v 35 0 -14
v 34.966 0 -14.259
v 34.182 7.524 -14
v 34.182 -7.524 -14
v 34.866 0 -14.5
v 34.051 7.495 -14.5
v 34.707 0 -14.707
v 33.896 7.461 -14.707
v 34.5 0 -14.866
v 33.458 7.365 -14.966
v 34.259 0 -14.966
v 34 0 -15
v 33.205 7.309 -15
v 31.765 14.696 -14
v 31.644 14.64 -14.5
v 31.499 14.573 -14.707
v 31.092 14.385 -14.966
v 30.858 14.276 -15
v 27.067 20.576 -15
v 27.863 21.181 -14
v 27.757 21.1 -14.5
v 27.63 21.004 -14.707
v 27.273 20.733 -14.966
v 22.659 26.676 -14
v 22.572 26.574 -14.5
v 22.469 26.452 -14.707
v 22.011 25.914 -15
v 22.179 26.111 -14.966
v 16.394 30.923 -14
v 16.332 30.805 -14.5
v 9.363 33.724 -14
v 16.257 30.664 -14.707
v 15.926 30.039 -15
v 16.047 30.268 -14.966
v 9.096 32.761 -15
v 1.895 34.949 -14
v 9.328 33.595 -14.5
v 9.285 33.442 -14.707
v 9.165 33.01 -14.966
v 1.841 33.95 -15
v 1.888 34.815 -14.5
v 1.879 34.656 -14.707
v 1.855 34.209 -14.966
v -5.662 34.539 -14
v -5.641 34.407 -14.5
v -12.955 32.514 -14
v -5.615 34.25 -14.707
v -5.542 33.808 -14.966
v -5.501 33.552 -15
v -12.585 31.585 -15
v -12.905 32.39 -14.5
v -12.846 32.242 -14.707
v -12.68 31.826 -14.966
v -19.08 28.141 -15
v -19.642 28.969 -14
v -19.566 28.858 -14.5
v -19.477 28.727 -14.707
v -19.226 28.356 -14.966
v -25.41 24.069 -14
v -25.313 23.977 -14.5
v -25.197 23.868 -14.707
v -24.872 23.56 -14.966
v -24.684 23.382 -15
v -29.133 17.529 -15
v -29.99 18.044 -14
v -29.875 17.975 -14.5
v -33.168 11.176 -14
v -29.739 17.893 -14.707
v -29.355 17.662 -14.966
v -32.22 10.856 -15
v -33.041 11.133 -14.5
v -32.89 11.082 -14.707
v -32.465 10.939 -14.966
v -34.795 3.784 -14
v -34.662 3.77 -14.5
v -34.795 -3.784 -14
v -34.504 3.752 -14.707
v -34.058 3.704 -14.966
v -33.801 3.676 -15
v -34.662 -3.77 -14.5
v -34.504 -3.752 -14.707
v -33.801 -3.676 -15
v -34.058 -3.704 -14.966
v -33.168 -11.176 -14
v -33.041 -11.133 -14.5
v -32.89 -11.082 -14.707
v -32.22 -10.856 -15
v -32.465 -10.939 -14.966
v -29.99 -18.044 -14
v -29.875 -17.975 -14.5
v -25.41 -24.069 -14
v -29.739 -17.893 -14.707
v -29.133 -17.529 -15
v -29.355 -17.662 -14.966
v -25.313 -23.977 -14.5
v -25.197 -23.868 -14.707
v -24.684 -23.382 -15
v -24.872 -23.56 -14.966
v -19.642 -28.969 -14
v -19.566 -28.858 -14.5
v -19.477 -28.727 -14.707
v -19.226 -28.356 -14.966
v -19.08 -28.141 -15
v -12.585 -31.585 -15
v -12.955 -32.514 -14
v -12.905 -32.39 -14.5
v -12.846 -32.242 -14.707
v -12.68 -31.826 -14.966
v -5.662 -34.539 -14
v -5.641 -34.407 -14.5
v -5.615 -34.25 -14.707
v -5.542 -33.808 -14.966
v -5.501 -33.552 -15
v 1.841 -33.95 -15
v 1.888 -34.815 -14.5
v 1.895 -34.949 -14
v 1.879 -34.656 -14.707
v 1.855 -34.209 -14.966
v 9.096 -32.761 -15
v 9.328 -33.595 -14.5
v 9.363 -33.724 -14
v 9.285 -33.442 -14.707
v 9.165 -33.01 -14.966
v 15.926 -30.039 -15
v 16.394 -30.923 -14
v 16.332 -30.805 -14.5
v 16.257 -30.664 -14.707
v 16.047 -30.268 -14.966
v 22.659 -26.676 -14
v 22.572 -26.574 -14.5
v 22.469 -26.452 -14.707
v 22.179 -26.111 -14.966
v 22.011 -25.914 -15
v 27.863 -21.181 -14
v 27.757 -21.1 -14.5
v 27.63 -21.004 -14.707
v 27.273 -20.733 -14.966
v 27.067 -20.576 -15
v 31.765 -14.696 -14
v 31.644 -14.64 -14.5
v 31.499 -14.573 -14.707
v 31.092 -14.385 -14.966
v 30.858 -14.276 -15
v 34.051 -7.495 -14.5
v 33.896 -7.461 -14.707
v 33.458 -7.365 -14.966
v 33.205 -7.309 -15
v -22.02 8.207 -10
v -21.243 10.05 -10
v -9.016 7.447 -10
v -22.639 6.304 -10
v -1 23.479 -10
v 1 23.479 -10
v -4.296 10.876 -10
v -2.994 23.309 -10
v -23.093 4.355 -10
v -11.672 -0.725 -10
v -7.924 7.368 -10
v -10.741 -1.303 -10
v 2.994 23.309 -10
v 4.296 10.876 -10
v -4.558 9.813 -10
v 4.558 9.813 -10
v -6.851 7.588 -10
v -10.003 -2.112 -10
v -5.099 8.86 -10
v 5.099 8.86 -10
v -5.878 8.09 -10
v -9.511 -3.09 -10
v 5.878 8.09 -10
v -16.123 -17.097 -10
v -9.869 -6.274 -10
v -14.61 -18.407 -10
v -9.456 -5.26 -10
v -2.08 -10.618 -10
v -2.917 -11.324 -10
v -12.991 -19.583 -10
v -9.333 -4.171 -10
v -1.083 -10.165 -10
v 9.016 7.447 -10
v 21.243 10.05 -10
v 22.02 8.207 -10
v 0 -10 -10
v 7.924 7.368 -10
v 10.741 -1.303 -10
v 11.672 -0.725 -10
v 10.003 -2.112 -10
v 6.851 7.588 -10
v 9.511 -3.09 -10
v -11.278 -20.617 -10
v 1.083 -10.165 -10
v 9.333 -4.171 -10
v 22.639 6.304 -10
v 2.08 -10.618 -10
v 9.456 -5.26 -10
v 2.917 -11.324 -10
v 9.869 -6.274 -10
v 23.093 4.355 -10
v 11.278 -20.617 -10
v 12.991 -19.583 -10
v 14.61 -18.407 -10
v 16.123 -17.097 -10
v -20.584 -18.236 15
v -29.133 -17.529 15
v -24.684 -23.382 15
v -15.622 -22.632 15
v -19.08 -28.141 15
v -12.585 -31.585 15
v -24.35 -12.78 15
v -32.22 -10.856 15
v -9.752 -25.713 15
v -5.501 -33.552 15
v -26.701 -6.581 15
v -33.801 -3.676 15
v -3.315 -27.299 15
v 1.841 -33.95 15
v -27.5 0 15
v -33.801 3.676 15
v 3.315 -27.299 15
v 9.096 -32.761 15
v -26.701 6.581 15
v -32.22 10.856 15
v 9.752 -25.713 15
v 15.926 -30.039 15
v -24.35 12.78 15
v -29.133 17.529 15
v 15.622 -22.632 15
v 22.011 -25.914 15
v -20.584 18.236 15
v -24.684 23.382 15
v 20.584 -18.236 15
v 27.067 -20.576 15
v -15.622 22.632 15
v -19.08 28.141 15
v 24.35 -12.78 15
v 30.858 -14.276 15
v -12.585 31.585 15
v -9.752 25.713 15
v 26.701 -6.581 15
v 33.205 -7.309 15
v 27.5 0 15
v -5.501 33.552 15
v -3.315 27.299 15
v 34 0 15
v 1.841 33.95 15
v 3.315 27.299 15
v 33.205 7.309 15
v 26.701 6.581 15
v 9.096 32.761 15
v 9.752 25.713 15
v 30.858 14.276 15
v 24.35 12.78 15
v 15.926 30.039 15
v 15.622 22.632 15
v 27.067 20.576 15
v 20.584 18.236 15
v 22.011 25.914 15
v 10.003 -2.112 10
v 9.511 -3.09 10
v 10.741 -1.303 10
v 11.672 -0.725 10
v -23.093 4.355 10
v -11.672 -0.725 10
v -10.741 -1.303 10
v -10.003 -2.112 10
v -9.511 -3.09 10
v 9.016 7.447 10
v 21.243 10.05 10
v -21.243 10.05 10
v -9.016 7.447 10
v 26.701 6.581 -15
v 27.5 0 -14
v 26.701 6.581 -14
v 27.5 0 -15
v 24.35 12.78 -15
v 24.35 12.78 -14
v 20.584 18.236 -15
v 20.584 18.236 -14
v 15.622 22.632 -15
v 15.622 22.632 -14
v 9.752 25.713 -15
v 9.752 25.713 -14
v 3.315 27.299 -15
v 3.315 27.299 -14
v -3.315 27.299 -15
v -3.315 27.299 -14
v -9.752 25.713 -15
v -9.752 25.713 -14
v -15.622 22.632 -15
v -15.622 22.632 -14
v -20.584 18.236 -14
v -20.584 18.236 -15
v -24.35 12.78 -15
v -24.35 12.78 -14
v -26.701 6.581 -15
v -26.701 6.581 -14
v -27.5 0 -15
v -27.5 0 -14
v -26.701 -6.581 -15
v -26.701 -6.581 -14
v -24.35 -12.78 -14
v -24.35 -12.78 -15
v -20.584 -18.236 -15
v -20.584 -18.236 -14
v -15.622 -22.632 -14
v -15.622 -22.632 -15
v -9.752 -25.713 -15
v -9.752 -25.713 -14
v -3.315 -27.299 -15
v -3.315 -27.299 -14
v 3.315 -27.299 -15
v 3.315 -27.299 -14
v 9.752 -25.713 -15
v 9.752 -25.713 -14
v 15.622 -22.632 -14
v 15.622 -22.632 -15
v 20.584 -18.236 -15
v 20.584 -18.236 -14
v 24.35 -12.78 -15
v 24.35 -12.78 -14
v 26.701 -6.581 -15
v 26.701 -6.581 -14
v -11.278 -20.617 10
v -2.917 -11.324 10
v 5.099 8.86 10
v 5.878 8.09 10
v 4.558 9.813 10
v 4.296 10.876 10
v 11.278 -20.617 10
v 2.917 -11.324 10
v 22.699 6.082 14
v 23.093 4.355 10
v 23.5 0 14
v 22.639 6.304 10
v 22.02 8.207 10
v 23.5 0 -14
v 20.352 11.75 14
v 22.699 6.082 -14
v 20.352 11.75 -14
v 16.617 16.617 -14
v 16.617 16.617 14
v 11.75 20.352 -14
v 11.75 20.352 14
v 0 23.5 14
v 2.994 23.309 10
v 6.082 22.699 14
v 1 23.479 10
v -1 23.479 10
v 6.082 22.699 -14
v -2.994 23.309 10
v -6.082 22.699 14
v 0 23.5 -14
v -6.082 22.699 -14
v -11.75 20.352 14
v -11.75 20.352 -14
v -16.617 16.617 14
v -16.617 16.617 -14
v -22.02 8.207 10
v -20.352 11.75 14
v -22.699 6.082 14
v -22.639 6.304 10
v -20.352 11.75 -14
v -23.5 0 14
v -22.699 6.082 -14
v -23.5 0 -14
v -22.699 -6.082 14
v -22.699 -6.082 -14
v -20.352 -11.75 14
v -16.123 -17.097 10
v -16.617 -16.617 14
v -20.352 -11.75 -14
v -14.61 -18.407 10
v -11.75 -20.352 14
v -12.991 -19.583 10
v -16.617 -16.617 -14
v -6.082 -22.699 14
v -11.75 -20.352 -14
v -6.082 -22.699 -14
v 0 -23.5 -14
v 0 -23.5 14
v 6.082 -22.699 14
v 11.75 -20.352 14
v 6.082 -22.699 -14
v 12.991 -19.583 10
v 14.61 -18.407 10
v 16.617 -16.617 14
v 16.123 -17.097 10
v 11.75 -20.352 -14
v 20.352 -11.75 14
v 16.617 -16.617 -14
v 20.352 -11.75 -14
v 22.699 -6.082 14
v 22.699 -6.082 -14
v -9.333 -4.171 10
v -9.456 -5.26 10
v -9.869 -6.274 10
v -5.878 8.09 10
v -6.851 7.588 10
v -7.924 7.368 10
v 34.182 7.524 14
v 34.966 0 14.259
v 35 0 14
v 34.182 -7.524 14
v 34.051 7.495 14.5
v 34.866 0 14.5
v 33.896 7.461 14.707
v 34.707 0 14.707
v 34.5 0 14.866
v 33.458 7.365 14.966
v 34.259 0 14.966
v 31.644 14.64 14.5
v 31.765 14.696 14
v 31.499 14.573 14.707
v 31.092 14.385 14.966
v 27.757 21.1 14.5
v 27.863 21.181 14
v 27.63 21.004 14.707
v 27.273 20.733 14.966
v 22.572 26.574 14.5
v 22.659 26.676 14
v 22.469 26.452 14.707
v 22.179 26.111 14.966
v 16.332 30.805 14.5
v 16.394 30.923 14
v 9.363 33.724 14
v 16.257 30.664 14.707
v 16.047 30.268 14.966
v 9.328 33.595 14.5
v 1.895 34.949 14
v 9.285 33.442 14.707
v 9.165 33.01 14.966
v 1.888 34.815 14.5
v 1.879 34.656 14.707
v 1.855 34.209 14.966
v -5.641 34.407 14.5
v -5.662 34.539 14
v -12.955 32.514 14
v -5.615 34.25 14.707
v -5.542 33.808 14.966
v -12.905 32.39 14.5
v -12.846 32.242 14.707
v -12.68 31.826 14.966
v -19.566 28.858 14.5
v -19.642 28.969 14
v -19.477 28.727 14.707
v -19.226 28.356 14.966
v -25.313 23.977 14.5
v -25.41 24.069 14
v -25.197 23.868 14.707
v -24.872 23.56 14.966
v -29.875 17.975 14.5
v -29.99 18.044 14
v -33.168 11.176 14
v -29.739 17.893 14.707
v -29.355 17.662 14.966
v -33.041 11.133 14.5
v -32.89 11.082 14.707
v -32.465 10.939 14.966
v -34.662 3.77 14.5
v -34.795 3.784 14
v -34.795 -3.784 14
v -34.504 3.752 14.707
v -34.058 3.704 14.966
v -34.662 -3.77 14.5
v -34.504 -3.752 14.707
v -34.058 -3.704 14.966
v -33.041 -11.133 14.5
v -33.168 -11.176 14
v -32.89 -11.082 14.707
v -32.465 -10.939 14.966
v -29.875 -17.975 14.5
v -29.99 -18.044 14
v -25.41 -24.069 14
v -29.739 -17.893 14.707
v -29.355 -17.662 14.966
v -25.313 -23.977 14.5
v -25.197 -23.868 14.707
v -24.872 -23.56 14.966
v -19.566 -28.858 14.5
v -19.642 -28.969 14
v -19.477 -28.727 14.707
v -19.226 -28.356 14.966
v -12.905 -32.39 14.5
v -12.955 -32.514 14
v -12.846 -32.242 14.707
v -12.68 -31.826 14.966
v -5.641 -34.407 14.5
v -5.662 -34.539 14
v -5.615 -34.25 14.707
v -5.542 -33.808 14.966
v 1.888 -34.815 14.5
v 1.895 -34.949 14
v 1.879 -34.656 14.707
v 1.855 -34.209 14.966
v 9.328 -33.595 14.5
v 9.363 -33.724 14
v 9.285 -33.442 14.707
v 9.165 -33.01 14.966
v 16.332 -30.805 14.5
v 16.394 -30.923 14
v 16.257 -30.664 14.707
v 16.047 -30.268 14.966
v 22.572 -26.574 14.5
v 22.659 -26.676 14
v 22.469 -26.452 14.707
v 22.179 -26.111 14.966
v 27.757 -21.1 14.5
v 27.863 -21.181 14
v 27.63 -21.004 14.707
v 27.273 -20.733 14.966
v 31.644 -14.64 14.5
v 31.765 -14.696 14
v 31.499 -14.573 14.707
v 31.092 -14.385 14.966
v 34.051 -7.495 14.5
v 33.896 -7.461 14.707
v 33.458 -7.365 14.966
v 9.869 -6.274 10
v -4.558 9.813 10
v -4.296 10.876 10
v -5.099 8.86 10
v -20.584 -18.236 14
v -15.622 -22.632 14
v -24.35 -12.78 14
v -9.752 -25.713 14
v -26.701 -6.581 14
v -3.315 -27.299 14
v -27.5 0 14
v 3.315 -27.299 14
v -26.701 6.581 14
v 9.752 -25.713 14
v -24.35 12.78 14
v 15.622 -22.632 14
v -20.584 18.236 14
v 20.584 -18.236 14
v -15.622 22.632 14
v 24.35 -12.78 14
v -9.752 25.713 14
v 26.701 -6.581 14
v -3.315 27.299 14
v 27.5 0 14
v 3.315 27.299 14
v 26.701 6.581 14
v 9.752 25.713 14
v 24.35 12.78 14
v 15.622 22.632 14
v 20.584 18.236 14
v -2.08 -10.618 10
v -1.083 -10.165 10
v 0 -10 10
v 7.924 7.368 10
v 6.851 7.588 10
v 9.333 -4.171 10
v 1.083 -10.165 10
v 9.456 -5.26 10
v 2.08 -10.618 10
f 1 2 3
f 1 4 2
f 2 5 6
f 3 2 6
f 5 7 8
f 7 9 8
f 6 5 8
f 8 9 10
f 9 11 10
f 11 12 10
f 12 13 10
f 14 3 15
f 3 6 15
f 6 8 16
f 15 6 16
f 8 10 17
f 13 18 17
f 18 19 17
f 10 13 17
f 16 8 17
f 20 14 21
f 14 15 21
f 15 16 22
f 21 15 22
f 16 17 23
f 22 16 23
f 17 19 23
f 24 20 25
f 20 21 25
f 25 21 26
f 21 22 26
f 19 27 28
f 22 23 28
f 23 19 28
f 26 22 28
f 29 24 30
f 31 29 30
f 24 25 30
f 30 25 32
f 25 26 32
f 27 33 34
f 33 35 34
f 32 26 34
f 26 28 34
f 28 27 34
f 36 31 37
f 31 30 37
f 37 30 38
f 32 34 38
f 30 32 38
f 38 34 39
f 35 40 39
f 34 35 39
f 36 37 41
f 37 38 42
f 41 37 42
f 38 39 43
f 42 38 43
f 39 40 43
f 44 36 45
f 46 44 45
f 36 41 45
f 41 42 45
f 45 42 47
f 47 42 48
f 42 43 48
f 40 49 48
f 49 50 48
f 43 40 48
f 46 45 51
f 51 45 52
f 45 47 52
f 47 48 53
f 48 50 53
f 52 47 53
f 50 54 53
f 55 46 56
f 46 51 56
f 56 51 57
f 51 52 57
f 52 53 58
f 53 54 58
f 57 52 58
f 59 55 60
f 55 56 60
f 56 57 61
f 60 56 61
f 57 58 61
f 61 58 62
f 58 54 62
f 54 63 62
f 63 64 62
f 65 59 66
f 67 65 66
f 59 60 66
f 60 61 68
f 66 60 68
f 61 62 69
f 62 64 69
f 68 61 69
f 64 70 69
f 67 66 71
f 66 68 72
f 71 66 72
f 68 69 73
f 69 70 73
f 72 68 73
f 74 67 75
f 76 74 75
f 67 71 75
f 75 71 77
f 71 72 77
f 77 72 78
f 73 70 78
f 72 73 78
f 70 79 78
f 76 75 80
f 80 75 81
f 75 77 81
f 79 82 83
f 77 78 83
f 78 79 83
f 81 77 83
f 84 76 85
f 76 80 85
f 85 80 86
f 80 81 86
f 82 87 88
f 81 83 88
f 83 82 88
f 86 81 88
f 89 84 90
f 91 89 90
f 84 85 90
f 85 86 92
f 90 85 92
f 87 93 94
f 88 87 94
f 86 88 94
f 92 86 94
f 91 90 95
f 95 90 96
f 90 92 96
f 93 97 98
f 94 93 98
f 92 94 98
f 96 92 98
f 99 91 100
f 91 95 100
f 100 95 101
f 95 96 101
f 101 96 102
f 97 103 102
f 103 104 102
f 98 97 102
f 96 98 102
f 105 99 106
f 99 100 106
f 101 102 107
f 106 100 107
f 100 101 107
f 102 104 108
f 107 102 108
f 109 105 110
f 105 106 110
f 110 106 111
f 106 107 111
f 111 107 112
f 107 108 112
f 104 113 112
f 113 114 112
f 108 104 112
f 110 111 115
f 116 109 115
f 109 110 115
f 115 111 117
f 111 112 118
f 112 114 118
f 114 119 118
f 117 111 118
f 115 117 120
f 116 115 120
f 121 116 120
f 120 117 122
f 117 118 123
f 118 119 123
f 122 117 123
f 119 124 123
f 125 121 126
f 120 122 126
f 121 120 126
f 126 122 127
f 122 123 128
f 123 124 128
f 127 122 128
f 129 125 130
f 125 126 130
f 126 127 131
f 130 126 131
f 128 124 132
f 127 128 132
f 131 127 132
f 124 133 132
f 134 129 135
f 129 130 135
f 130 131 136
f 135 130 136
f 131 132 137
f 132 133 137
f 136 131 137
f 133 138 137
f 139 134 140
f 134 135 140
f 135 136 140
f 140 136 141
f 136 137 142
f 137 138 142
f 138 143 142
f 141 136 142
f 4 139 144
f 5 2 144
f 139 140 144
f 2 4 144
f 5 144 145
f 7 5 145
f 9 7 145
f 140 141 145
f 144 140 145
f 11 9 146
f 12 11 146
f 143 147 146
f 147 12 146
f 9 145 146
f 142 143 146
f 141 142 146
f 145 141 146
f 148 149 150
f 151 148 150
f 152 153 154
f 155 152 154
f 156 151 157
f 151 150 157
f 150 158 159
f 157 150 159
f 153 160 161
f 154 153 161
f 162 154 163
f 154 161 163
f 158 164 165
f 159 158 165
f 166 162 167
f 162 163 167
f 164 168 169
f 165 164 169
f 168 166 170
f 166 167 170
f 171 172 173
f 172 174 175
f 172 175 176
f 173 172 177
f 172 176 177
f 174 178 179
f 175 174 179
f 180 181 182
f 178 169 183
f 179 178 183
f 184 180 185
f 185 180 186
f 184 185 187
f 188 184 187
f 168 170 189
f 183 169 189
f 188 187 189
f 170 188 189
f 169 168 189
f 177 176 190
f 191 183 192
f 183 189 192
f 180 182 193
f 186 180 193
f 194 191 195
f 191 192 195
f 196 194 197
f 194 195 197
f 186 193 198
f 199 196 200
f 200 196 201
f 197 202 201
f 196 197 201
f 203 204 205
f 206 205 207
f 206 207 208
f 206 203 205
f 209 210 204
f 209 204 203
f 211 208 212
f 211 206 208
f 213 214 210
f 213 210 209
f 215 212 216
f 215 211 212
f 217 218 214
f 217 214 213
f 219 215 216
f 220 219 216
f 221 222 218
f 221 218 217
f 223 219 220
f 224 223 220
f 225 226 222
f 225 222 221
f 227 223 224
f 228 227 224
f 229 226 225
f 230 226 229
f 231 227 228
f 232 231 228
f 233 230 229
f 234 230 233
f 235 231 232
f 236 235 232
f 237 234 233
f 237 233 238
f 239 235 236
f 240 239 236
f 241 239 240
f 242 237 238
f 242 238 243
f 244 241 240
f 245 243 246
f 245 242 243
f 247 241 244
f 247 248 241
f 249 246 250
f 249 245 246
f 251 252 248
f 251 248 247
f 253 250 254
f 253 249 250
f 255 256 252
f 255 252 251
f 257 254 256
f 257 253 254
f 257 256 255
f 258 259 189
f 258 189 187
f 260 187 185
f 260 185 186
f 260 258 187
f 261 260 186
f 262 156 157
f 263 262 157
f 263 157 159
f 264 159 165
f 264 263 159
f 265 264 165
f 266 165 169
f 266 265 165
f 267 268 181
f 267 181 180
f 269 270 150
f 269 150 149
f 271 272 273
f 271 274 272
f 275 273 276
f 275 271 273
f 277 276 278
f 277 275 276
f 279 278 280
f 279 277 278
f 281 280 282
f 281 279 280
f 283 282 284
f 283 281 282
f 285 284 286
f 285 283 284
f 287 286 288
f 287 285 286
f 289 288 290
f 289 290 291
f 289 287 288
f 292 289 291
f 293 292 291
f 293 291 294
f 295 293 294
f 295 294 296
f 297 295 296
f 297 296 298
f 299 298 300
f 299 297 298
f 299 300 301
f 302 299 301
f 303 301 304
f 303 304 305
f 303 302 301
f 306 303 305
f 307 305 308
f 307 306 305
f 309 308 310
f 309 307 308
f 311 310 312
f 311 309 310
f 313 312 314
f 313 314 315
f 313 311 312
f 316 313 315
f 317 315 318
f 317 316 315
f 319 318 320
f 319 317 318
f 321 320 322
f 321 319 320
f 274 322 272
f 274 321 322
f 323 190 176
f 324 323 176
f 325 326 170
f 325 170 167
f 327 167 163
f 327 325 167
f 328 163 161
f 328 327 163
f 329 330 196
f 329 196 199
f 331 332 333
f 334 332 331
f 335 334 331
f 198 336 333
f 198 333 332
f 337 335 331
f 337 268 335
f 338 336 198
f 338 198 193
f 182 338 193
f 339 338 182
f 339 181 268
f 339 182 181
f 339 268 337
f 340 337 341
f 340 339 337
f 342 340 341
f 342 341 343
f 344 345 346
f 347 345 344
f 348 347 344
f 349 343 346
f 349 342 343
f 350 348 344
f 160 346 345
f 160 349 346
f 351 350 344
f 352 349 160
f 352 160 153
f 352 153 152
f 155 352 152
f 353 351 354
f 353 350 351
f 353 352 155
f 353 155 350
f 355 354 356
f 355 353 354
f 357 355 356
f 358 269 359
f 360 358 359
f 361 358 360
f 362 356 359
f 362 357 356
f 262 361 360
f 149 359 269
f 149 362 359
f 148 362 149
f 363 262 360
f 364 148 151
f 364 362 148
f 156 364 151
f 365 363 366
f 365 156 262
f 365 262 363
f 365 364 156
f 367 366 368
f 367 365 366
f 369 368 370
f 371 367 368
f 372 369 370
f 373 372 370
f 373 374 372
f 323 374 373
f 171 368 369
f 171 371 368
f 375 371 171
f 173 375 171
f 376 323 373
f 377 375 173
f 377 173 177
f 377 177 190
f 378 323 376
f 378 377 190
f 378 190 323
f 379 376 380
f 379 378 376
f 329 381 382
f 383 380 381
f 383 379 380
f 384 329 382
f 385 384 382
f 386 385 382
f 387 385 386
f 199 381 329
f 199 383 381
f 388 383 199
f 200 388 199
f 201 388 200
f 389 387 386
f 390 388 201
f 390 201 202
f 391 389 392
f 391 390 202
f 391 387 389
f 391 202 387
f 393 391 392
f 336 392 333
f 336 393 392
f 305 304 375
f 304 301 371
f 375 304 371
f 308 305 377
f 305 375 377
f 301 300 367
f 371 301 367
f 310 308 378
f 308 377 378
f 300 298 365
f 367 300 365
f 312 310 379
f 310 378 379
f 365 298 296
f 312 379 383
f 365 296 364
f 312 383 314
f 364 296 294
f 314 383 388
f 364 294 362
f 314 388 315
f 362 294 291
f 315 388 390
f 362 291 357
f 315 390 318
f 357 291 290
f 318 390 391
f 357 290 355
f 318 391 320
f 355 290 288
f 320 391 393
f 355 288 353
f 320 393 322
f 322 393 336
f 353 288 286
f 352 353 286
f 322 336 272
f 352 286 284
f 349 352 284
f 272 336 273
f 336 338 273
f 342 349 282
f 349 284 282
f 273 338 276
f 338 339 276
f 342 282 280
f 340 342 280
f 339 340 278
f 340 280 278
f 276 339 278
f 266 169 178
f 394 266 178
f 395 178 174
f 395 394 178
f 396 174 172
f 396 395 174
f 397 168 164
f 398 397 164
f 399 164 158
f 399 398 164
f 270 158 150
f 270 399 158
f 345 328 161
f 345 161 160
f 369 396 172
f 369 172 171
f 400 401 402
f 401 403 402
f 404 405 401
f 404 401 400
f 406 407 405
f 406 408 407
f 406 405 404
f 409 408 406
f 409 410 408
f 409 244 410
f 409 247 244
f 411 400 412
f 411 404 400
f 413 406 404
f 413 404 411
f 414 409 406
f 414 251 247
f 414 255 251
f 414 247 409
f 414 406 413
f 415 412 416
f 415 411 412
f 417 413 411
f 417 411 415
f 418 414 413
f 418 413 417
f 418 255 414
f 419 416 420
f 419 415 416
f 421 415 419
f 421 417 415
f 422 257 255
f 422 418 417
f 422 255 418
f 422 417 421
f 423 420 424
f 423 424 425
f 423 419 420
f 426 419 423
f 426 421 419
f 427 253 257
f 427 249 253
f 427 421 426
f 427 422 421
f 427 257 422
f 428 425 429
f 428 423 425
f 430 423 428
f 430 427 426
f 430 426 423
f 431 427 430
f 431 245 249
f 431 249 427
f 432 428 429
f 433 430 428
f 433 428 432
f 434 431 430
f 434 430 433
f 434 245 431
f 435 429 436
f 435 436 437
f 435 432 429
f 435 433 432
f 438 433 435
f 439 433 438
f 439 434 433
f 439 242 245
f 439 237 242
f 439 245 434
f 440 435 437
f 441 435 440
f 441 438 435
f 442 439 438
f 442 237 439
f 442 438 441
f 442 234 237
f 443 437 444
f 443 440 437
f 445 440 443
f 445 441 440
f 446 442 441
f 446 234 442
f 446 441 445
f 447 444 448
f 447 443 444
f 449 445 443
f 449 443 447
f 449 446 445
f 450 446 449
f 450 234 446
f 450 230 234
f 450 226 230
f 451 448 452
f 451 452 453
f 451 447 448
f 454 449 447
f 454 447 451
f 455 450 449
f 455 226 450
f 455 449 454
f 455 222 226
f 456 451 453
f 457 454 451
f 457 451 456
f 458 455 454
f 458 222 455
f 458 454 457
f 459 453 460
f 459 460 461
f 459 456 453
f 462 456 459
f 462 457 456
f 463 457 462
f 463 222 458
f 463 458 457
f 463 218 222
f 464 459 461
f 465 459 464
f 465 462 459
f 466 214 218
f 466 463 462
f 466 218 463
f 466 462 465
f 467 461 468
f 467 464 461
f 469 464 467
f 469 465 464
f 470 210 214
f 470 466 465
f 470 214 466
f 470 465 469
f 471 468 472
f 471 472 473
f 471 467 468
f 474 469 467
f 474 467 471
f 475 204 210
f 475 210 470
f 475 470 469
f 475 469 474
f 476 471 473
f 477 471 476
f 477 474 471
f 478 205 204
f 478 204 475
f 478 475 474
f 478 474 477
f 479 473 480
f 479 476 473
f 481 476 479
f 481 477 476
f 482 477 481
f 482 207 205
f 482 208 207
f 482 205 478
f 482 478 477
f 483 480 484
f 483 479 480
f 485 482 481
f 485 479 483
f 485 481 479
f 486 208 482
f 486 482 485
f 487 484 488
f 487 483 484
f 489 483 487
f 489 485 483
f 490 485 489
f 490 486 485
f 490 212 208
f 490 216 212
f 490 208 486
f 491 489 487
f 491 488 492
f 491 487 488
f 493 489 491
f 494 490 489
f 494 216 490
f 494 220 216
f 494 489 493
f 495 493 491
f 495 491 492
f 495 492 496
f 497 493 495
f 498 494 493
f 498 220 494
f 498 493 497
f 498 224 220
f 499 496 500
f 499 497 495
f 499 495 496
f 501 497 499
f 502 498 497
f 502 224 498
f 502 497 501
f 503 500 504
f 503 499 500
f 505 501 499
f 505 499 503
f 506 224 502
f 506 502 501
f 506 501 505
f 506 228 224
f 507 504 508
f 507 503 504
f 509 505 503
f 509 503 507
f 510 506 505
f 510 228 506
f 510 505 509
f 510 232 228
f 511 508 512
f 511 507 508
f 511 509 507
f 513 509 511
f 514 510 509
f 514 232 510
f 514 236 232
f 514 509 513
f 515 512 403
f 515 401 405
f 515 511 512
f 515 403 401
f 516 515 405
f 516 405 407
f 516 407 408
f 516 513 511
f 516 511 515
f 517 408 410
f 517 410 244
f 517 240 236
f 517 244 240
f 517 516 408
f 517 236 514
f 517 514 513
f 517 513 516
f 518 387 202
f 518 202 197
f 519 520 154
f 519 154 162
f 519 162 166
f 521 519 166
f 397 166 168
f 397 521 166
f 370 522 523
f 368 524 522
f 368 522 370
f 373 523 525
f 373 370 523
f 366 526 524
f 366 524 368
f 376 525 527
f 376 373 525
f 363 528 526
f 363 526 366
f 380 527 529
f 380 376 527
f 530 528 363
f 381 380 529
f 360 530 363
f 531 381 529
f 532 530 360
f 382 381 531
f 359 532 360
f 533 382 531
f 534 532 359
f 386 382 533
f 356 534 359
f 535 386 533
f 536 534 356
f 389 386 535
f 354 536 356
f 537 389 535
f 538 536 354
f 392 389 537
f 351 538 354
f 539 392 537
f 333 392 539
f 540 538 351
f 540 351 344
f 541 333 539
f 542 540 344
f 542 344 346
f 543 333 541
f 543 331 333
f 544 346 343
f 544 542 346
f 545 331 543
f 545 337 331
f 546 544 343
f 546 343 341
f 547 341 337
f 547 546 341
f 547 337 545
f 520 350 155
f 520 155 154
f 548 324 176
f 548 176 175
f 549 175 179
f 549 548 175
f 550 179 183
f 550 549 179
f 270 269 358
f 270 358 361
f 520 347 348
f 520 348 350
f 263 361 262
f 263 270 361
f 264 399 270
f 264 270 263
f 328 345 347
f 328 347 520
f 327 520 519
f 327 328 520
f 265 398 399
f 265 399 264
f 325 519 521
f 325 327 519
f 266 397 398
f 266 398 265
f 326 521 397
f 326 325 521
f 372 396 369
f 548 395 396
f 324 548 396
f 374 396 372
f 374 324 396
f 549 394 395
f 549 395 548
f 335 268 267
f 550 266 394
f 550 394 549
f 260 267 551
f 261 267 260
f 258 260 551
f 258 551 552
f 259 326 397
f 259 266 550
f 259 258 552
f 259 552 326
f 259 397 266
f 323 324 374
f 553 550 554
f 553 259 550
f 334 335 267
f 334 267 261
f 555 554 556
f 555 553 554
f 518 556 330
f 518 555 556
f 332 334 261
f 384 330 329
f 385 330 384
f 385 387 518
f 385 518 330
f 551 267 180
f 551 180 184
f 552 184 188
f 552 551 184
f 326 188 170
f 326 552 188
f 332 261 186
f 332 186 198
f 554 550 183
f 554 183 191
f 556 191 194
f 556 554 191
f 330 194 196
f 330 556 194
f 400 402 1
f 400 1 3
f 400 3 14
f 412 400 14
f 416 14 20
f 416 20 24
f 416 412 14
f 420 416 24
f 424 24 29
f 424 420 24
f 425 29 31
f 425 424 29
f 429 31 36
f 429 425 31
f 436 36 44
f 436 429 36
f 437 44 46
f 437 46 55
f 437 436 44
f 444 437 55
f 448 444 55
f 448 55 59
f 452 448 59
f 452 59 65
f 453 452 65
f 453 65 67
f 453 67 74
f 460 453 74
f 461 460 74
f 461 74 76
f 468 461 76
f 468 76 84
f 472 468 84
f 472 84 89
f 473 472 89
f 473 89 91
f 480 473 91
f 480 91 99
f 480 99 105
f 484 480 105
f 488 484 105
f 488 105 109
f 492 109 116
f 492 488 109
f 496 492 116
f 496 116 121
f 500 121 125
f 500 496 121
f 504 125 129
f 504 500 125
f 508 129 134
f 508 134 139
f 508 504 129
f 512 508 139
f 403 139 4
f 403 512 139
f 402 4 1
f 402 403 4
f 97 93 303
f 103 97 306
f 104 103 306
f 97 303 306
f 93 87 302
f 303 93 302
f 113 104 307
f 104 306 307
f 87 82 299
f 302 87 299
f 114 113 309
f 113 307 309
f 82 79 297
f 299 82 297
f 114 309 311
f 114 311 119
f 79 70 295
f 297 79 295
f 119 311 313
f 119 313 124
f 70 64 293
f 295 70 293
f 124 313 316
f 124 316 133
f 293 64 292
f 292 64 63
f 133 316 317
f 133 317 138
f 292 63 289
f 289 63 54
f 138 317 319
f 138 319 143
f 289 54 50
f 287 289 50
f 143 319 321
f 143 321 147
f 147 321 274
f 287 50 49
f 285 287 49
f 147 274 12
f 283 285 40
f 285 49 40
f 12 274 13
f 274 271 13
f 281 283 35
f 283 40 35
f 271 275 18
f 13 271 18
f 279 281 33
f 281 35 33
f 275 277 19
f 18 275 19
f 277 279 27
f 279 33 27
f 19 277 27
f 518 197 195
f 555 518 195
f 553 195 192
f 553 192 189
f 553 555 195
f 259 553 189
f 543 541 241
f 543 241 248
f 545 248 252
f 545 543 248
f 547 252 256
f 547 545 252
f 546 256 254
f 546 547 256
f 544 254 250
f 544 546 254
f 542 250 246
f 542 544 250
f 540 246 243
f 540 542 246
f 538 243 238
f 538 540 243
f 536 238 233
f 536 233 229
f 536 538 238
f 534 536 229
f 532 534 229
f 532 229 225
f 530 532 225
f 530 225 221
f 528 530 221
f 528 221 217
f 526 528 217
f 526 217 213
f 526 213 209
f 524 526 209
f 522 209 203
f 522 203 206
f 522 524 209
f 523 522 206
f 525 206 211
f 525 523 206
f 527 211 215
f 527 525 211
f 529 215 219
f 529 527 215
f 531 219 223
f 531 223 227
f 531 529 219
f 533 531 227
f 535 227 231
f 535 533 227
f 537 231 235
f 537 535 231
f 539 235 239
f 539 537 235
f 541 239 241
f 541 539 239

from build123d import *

# Parameters (mm, degrees)
SKETCH2_R           = 35
SKETCH2_R_2         = 27.5
BOSS_EXTRUDE2_DEPTH = 15
FILLET2_R           = 1
SKETCH4_R           = 27.5
SKETCH4_R_2         = 23.5
BOSS_EXTRUDE4_DEPTH = 14
BOSS_EXTRUDE5_DEPTH = 10
CIRPATTERN1_COUNT   = 5
FILLET3_R           = 4


with BuildPart() as part:
    # Sketch2 → Boss-Extrude2 (new, symmetric)
    with BuildSketch(Plane.XY):
        Circle(SKETCH2_R)
        Circle(SKETCH2_R_2, mode=Mode.SUBTRACT)
    extrude(amount=BOSS_EXTRUDE2_DEPTH, both=True)

    # Fillet2
    fillet2_edges = [part.edges().sort_by_distance(p)[0] for p in [
        (-35, 0, -15),
        (-35, 0, 15),
    ]]
    fillet(fillet2_edges, radius=FILLET2_R)

    # Sketch4 → Boss-Extrude4 (add, symmetric)
    with BuildSketch(Plane.XY):
        Circle(SKETCH4_R)
        Circle(SKETCH4_R_2, mode=Mode.SUBTRACT)
    extrude(amount=BOSS_EXTRUDE4_DEPTH, both=True)

    # Sketch5 → Boss-Extrude5 (add, symmetric)
    with BuildSketch(Plane.XY):
        with BuildLine():
            Line((-2.9938824, 23.308510638), (-4.5, 8.93028555))
            ThreePointArc((-4.5, 8.93028555), (0, -10), (4.5, 8.93028555))
            Line((4.5, 8.93028555), (2.9938824, 23.308510638))
            ThreePointArc((2.9938824, 23.308510638), (0, 23.5), (-2.9938824, 23.308510638))
        make_face()
    boss_extrude5 = extrude(amount=BOSS_EXTRUDE5_DEPTH, both=True)

    # CirPattern1: Boss-Extrude5 ×5 about axis
    cirpattern1_axis = Axis((0, 0, 0), (0, 0, 1))
    for i in range(1, CIRPATTERN1_COUNT):
        add(boss_extrude5.rotate(cirpattern1_axis, i * 360 / CIRPATTERN1_COUNT))

    # Fillet3
    # the kernel refuses this fillet: 4 mm, written as the material it adds along each edge
    with BuildSketch(Plane(origin=(-4.5, 8.93028555, 10), x_dir=(0.10417989743620854, 0.9945584693572224, 0), z_dir=(0, 0, -1)), Plane(origin=(-9.883782739, -1.520144324, 10), x_dir=(-0.9136879543386928, 0.40641643925458404, 0), z_dir=(0, 0, -1)), Plane(origin=(-1.60851367, -9.86978641, 10), x_dir=(-0.6688701083288824, -0.7433792963111827, 0), z_dir=(0, 0, -1)), Plane(origin=(8.88966662, -4.579719139, 10), x_dir=(0.5003034933326179, -0.8658501109078748, 0), z_dir=(0, 0, -1)), Plane(origin=(7.10262979, 7.039364323, 10), x_dir=(0.9780746718987476, 0.20825449860724982, 0), z_dir=(0, 0, -1))) as fillet3_piece_1:
        with BuildLine():
            CenterArc((1.956767483, -4), FILLET3_R, 90, 47.790159625)
            ThreePointArc((-1.005989395, -1.312608759), (-0.475813738, -0.677135992), (0, 0))
            Line((0, 0), (1.956767483, 0))
        make_face()
    extrude(amount=20)
    with BuildSketch(Plane(origin=(-7.10262979, 7.039364323, 10), x_dir=(-0.9780746718987477, 0.20825449860724976, 0), z_dir=(0, 0, -1)), Plane(origin=(-8.88966662, -4.579719139, 10), x_dir=(-0.5003034933326195, -0.8658501109078739, 0), z_dir=(0, 0, -1)), Plane(origin=(1.60851367, -9.86978641, 10), x_dir=(0.6688701083288834, -0.7433792963111817, 0), z_dir=(0, 0, -1)), Plane(origin=(9.883782739, -1.520144324, 10), x_dir=(0.9136879543386924, 0.4064164392545845, 0), z_dir=(0, 0, -1)), Plane(origin=(4.5, 8.93028555, 10), x_dir=(-0.10417989743620937, 0.9945584693572224, 0), z_dir=(0, 0, -1))) as fillet3_piece_2:
        with BuildLine():
            CenterArc((1.956767483, 4), FILLET3_R, 222.209840375, 47.790159625)
            ThreePointArc((-1.005989395, 1.312608759), (-0.475813738, 0.677135992), (0, 0))
            Line((0, 0), (1.956767483, 0))
        make_face()
    extrude(amount=20)


solid = part.part
